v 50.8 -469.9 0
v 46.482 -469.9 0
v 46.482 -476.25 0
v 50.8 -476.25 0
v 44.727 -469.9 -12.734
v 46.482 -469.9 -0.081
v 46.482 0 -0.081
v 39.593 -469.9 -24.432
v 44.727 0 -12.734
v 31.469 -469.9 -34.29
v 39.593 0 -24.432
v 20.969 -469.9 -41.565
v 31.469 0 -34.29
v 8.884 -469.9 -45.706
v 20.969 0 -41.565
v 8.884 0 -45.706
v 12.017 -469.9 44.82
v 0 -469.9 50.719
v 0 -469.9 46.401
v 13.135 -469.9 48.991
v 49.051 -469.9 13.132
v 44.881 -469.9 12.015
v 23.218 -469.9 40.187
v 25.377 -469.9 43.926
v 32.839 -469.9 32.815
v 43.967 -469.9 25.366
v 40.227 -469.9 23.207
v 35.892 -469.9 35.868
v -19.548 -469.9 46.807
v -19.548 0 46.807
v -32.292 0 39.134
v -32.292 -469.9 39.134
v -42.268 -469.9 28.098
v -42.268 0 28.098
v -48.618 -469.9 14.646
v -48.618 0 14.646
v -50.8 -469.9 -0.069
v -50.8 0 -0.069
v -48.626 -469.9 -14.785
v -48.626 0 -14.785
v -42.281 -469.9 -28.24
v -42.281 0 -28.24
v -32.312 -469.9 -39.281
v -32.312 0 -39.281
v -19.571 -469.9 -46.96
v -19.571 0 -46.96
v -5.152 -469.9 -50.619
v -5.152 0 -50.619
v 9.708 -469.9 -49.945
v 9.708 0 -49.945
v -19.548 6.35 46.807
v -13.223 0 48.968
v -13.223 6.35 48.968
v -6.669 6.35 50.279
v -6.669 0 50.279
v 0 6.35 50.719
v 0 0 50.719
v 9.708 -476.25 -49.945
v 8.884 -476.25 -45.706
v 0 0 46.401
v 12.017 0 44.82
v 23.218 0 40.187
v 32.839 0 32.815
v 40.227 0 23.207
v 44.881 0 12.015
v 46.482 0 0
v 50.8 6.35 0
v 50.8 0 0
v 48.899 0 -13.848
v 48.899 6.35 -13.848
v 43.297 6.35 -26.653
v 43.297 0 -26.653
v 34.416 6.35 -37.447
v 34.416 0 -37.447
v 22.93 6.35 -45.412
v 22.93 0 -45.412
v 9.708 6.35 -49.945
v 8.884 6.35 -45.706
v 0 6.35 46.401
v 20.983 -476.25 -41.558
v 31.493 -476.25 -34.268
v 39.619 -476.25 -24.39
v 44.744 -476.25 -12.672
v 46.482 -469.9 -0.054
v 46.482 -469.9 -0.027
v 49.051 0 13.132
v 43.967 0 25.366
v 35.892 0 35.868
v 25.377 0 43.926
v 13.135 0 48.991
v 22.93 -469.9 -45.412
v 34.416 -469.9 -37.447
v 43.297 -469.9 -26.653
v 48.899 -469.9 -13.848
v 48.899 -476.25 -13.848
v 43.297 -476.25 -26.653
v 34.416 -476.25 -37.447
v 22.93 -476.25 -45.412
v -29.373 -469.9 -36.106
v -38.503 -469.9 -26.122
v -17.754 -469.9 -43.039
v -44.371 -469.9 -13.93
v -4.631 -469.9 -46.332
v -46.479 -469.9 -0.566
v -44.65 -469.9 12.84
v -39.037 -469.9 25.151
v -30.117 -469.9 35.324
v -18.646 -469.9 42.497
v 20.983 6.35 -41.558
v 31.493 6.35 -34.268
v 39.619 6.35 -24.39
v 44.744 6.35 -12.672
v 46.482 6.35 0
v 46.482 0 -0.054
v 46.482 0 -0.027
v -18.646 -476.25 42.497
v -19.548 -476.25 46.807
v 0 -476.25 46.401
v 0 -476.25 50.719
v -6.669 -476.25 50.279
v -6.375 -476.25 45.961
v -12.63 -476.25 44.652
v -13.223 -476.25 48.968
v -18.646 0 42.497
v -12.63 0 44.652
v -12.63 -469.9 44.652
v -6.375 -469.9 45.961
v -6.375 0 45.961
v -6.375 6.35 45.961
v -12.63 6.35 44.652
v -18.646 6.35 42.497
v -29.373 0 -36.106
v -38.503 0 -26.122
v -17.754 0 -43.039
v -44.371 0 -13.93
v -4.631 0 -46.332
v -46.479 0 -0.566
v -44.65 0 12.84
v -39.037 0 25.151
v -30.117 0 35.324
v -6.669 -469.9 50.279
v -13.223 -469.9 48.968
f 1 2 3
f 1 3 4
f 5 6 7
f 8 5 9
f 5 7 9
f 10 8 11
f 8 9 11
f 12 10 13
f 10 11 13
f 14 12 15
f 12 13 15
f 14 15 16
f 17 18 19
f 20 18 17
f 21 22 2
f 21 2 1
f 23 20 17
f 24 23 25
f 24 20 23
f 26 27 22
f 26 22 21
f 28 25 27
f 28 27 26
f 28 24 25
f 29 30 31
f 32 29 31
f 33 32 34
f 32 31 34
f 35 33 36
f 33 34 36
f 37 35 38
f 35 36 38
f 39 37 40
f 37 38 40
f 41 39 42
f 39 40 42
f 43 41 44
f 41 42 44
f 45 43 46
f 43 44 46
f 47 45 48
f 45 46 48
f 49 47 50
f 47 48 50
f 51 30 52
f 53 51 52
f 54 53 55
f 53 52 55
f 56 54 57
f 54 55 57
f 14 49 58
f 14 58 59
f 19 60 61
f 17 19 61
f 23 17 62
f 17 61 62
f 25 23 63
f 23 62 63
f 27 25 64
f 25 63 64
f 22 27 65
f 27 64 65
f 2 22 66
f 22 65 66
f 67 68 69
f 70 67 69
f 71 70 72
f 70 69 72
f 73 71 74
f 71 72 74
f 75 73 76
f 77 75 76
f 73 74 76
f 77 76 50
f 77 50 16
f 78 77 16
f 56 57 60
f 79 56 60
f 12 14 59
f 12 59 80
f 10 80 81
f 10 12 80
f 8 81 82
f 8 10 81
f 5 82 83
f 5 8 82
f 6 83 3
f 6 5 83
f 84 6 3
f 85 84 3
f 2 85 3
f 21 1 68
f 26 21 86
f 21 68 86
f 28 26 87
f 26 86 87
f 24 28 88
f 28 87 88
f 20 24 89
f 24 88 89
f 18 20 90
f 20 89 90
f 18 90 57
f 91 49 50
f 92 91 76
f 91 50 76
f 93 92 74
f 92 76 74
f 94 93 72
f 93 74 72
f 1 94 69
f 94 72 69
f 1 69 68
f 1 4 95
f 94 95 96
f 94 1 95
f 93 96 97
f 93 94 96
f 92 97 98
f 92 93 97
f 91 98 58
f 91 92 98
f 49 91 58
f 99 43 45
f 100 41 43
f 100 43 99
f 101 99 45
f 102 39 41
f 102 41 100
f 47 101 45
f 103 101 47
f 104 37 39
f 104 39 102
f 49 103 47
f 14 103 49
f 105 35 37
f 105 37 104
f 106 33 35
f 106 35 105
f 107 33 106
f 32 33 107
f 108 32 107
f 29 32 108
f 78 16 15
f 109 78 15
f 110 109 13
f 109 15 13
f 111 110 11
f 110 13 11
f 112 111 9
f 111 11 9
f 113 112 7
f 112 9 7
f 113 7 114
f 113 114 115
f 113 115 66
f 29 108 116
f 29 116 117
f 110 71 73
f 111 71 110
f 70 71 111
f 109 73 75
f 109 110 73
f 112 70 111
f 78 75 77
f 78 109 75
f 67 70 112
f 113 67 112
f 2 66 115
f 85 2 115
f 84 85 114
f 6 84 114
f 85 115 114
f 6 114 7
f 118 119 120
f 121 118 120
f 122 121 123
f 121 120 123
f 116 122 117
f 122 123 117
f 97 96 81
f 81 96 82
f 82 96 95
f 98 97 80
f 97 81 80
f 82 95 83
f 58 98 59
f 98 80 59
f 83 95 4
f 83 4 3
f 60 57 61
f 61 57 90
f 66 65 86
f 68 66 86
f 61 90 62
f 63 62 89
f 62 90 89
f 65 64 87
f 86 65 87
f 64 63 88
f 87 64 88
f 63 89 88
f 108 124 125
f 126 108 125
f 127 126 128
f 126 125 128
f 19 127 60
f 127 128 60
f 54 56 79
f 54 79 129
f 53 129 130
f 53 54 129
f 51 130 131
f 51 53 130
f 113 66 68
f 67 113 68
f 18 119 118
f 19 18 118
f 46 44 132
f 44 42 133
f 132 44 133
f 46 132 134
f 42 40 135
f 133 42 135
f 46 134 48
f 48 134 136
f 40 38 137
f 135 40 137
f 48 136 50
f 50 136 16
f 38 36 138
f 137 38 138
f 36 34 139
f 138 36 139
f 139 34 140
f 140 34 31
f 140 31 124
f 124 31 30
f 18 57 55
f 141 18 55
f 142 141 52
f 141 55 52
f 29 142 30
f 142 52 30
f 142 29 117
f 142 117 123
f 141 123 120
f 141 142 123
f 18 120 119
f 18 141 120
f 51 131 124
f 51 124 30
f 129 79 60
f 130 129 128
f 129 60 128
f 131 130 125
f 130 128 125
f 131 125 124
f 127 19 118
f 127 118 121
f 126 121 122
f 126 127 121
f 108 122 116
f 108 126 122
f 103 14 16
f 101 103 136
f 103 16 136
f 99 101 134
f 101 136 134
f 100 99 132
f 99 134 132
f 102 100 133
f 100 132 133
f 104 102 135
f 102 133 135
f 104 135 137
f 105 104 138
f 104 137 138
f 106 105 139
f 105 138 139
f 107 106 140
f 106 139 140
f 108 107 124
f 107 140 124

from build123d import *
from build123d import SkipClean  # not in build123d's __all__

# Parameters (mm, degrees)
F1_DEPTH      = 469.9
F3_DEPTH      = 6.35
F3_DEPTH_BACK = 476.25


with BuildPart() as f1:
    # F0 (on Front) → F1 (new body)
    with BuildSketch(Plane.XZ):
        with BuildLine():
            ThreePointArc((0, 46.4007208579), (32.8677374031, 32.786458261), (46.482, -0.0812791421))
            ThreePointArc((46.482, -0.0812791421), (-25.4350635734, -38.9867268971), (-18.6457425678, 42.4970323333))
            Line((-18.6457425678, 42.4970323333), (-19.5480847725, 46.8070177104))
            ThreePointArc((-19.5480847725, 46.8070177104), (-28.1744325014, -42.3523254175), (50.8, -0.0812791421))
            ThreePointArc((50.8, -0.0812791421), (35.9210244843, 35.8397453422), (0, 50.7187208579))
            Line((0, 50.7187208579), (0, 46.4007208579))
        make_face()
        with BuildLine():
            ThreePointArc((-18.6457425678, 42.4970323333), (-9.525, 45.4143327232), (0, 46.4007208579))
            Line((0, 46.4007208579), (0, 50.7187208579))
            ThreePointArc((0, 50.7187208579), (-9.9678111914, 49.731196605), (-19.5480847725, 46.8070177104))
            Line((-19.5480847725, 46.8070177104), (-18.6457425678, 42.4970323333))
        make_face()
    extrude(amount=F1_DEPTH)

    # F2 (on face) → F3 (join, two sides)
    with BuildSketch(Plane(origin=(0, 0, 0), x_dir=(-1, 0, 0), z_dir=(0, 1, 0))) as f3_sk:
        with BuildLine():
            ThreePointArc((19.5480847725, 46.8070177104), (9.9678111914, 49.731196605), (0, 50.7187208579))
            Line((0, 50.7187208579), (0, 46.4007208579))
            ThreePointArc((0, 46.4007208579), (9.525, 45.4143327232), (18.6457425678, 42.4970323333))
            Line((18.6457425678, 42.4970323333), (19.5480847725, 46.8070177104))
        make_face()
        with BuildLine():
            Line((-46.481928937, 0), (-50.7999349773, 0))
            ThreePointArc((-50.7999349773, 0), (-39.2292934041, -32.3566960877), (-9.7083203647, -49.9449785205))
            Line((-9.7083203647, -49.9449785205), (-8.8844070807, -45.7063121265))
            ThreePointArc((-8.8844070807, -45.7063121265), (-35.897416802, -29.610108969), (-46.481928937, 0))
        make_face()
    with SkipClean():  # cleaning this boolean's faces spoils the solid; the shape is the same uncleaned
        extrude(amount=F3_DEPTH)
        extrude(f3_sk.sketch, amount=-F3_DEPTH_BACK)


solid = f1.part
